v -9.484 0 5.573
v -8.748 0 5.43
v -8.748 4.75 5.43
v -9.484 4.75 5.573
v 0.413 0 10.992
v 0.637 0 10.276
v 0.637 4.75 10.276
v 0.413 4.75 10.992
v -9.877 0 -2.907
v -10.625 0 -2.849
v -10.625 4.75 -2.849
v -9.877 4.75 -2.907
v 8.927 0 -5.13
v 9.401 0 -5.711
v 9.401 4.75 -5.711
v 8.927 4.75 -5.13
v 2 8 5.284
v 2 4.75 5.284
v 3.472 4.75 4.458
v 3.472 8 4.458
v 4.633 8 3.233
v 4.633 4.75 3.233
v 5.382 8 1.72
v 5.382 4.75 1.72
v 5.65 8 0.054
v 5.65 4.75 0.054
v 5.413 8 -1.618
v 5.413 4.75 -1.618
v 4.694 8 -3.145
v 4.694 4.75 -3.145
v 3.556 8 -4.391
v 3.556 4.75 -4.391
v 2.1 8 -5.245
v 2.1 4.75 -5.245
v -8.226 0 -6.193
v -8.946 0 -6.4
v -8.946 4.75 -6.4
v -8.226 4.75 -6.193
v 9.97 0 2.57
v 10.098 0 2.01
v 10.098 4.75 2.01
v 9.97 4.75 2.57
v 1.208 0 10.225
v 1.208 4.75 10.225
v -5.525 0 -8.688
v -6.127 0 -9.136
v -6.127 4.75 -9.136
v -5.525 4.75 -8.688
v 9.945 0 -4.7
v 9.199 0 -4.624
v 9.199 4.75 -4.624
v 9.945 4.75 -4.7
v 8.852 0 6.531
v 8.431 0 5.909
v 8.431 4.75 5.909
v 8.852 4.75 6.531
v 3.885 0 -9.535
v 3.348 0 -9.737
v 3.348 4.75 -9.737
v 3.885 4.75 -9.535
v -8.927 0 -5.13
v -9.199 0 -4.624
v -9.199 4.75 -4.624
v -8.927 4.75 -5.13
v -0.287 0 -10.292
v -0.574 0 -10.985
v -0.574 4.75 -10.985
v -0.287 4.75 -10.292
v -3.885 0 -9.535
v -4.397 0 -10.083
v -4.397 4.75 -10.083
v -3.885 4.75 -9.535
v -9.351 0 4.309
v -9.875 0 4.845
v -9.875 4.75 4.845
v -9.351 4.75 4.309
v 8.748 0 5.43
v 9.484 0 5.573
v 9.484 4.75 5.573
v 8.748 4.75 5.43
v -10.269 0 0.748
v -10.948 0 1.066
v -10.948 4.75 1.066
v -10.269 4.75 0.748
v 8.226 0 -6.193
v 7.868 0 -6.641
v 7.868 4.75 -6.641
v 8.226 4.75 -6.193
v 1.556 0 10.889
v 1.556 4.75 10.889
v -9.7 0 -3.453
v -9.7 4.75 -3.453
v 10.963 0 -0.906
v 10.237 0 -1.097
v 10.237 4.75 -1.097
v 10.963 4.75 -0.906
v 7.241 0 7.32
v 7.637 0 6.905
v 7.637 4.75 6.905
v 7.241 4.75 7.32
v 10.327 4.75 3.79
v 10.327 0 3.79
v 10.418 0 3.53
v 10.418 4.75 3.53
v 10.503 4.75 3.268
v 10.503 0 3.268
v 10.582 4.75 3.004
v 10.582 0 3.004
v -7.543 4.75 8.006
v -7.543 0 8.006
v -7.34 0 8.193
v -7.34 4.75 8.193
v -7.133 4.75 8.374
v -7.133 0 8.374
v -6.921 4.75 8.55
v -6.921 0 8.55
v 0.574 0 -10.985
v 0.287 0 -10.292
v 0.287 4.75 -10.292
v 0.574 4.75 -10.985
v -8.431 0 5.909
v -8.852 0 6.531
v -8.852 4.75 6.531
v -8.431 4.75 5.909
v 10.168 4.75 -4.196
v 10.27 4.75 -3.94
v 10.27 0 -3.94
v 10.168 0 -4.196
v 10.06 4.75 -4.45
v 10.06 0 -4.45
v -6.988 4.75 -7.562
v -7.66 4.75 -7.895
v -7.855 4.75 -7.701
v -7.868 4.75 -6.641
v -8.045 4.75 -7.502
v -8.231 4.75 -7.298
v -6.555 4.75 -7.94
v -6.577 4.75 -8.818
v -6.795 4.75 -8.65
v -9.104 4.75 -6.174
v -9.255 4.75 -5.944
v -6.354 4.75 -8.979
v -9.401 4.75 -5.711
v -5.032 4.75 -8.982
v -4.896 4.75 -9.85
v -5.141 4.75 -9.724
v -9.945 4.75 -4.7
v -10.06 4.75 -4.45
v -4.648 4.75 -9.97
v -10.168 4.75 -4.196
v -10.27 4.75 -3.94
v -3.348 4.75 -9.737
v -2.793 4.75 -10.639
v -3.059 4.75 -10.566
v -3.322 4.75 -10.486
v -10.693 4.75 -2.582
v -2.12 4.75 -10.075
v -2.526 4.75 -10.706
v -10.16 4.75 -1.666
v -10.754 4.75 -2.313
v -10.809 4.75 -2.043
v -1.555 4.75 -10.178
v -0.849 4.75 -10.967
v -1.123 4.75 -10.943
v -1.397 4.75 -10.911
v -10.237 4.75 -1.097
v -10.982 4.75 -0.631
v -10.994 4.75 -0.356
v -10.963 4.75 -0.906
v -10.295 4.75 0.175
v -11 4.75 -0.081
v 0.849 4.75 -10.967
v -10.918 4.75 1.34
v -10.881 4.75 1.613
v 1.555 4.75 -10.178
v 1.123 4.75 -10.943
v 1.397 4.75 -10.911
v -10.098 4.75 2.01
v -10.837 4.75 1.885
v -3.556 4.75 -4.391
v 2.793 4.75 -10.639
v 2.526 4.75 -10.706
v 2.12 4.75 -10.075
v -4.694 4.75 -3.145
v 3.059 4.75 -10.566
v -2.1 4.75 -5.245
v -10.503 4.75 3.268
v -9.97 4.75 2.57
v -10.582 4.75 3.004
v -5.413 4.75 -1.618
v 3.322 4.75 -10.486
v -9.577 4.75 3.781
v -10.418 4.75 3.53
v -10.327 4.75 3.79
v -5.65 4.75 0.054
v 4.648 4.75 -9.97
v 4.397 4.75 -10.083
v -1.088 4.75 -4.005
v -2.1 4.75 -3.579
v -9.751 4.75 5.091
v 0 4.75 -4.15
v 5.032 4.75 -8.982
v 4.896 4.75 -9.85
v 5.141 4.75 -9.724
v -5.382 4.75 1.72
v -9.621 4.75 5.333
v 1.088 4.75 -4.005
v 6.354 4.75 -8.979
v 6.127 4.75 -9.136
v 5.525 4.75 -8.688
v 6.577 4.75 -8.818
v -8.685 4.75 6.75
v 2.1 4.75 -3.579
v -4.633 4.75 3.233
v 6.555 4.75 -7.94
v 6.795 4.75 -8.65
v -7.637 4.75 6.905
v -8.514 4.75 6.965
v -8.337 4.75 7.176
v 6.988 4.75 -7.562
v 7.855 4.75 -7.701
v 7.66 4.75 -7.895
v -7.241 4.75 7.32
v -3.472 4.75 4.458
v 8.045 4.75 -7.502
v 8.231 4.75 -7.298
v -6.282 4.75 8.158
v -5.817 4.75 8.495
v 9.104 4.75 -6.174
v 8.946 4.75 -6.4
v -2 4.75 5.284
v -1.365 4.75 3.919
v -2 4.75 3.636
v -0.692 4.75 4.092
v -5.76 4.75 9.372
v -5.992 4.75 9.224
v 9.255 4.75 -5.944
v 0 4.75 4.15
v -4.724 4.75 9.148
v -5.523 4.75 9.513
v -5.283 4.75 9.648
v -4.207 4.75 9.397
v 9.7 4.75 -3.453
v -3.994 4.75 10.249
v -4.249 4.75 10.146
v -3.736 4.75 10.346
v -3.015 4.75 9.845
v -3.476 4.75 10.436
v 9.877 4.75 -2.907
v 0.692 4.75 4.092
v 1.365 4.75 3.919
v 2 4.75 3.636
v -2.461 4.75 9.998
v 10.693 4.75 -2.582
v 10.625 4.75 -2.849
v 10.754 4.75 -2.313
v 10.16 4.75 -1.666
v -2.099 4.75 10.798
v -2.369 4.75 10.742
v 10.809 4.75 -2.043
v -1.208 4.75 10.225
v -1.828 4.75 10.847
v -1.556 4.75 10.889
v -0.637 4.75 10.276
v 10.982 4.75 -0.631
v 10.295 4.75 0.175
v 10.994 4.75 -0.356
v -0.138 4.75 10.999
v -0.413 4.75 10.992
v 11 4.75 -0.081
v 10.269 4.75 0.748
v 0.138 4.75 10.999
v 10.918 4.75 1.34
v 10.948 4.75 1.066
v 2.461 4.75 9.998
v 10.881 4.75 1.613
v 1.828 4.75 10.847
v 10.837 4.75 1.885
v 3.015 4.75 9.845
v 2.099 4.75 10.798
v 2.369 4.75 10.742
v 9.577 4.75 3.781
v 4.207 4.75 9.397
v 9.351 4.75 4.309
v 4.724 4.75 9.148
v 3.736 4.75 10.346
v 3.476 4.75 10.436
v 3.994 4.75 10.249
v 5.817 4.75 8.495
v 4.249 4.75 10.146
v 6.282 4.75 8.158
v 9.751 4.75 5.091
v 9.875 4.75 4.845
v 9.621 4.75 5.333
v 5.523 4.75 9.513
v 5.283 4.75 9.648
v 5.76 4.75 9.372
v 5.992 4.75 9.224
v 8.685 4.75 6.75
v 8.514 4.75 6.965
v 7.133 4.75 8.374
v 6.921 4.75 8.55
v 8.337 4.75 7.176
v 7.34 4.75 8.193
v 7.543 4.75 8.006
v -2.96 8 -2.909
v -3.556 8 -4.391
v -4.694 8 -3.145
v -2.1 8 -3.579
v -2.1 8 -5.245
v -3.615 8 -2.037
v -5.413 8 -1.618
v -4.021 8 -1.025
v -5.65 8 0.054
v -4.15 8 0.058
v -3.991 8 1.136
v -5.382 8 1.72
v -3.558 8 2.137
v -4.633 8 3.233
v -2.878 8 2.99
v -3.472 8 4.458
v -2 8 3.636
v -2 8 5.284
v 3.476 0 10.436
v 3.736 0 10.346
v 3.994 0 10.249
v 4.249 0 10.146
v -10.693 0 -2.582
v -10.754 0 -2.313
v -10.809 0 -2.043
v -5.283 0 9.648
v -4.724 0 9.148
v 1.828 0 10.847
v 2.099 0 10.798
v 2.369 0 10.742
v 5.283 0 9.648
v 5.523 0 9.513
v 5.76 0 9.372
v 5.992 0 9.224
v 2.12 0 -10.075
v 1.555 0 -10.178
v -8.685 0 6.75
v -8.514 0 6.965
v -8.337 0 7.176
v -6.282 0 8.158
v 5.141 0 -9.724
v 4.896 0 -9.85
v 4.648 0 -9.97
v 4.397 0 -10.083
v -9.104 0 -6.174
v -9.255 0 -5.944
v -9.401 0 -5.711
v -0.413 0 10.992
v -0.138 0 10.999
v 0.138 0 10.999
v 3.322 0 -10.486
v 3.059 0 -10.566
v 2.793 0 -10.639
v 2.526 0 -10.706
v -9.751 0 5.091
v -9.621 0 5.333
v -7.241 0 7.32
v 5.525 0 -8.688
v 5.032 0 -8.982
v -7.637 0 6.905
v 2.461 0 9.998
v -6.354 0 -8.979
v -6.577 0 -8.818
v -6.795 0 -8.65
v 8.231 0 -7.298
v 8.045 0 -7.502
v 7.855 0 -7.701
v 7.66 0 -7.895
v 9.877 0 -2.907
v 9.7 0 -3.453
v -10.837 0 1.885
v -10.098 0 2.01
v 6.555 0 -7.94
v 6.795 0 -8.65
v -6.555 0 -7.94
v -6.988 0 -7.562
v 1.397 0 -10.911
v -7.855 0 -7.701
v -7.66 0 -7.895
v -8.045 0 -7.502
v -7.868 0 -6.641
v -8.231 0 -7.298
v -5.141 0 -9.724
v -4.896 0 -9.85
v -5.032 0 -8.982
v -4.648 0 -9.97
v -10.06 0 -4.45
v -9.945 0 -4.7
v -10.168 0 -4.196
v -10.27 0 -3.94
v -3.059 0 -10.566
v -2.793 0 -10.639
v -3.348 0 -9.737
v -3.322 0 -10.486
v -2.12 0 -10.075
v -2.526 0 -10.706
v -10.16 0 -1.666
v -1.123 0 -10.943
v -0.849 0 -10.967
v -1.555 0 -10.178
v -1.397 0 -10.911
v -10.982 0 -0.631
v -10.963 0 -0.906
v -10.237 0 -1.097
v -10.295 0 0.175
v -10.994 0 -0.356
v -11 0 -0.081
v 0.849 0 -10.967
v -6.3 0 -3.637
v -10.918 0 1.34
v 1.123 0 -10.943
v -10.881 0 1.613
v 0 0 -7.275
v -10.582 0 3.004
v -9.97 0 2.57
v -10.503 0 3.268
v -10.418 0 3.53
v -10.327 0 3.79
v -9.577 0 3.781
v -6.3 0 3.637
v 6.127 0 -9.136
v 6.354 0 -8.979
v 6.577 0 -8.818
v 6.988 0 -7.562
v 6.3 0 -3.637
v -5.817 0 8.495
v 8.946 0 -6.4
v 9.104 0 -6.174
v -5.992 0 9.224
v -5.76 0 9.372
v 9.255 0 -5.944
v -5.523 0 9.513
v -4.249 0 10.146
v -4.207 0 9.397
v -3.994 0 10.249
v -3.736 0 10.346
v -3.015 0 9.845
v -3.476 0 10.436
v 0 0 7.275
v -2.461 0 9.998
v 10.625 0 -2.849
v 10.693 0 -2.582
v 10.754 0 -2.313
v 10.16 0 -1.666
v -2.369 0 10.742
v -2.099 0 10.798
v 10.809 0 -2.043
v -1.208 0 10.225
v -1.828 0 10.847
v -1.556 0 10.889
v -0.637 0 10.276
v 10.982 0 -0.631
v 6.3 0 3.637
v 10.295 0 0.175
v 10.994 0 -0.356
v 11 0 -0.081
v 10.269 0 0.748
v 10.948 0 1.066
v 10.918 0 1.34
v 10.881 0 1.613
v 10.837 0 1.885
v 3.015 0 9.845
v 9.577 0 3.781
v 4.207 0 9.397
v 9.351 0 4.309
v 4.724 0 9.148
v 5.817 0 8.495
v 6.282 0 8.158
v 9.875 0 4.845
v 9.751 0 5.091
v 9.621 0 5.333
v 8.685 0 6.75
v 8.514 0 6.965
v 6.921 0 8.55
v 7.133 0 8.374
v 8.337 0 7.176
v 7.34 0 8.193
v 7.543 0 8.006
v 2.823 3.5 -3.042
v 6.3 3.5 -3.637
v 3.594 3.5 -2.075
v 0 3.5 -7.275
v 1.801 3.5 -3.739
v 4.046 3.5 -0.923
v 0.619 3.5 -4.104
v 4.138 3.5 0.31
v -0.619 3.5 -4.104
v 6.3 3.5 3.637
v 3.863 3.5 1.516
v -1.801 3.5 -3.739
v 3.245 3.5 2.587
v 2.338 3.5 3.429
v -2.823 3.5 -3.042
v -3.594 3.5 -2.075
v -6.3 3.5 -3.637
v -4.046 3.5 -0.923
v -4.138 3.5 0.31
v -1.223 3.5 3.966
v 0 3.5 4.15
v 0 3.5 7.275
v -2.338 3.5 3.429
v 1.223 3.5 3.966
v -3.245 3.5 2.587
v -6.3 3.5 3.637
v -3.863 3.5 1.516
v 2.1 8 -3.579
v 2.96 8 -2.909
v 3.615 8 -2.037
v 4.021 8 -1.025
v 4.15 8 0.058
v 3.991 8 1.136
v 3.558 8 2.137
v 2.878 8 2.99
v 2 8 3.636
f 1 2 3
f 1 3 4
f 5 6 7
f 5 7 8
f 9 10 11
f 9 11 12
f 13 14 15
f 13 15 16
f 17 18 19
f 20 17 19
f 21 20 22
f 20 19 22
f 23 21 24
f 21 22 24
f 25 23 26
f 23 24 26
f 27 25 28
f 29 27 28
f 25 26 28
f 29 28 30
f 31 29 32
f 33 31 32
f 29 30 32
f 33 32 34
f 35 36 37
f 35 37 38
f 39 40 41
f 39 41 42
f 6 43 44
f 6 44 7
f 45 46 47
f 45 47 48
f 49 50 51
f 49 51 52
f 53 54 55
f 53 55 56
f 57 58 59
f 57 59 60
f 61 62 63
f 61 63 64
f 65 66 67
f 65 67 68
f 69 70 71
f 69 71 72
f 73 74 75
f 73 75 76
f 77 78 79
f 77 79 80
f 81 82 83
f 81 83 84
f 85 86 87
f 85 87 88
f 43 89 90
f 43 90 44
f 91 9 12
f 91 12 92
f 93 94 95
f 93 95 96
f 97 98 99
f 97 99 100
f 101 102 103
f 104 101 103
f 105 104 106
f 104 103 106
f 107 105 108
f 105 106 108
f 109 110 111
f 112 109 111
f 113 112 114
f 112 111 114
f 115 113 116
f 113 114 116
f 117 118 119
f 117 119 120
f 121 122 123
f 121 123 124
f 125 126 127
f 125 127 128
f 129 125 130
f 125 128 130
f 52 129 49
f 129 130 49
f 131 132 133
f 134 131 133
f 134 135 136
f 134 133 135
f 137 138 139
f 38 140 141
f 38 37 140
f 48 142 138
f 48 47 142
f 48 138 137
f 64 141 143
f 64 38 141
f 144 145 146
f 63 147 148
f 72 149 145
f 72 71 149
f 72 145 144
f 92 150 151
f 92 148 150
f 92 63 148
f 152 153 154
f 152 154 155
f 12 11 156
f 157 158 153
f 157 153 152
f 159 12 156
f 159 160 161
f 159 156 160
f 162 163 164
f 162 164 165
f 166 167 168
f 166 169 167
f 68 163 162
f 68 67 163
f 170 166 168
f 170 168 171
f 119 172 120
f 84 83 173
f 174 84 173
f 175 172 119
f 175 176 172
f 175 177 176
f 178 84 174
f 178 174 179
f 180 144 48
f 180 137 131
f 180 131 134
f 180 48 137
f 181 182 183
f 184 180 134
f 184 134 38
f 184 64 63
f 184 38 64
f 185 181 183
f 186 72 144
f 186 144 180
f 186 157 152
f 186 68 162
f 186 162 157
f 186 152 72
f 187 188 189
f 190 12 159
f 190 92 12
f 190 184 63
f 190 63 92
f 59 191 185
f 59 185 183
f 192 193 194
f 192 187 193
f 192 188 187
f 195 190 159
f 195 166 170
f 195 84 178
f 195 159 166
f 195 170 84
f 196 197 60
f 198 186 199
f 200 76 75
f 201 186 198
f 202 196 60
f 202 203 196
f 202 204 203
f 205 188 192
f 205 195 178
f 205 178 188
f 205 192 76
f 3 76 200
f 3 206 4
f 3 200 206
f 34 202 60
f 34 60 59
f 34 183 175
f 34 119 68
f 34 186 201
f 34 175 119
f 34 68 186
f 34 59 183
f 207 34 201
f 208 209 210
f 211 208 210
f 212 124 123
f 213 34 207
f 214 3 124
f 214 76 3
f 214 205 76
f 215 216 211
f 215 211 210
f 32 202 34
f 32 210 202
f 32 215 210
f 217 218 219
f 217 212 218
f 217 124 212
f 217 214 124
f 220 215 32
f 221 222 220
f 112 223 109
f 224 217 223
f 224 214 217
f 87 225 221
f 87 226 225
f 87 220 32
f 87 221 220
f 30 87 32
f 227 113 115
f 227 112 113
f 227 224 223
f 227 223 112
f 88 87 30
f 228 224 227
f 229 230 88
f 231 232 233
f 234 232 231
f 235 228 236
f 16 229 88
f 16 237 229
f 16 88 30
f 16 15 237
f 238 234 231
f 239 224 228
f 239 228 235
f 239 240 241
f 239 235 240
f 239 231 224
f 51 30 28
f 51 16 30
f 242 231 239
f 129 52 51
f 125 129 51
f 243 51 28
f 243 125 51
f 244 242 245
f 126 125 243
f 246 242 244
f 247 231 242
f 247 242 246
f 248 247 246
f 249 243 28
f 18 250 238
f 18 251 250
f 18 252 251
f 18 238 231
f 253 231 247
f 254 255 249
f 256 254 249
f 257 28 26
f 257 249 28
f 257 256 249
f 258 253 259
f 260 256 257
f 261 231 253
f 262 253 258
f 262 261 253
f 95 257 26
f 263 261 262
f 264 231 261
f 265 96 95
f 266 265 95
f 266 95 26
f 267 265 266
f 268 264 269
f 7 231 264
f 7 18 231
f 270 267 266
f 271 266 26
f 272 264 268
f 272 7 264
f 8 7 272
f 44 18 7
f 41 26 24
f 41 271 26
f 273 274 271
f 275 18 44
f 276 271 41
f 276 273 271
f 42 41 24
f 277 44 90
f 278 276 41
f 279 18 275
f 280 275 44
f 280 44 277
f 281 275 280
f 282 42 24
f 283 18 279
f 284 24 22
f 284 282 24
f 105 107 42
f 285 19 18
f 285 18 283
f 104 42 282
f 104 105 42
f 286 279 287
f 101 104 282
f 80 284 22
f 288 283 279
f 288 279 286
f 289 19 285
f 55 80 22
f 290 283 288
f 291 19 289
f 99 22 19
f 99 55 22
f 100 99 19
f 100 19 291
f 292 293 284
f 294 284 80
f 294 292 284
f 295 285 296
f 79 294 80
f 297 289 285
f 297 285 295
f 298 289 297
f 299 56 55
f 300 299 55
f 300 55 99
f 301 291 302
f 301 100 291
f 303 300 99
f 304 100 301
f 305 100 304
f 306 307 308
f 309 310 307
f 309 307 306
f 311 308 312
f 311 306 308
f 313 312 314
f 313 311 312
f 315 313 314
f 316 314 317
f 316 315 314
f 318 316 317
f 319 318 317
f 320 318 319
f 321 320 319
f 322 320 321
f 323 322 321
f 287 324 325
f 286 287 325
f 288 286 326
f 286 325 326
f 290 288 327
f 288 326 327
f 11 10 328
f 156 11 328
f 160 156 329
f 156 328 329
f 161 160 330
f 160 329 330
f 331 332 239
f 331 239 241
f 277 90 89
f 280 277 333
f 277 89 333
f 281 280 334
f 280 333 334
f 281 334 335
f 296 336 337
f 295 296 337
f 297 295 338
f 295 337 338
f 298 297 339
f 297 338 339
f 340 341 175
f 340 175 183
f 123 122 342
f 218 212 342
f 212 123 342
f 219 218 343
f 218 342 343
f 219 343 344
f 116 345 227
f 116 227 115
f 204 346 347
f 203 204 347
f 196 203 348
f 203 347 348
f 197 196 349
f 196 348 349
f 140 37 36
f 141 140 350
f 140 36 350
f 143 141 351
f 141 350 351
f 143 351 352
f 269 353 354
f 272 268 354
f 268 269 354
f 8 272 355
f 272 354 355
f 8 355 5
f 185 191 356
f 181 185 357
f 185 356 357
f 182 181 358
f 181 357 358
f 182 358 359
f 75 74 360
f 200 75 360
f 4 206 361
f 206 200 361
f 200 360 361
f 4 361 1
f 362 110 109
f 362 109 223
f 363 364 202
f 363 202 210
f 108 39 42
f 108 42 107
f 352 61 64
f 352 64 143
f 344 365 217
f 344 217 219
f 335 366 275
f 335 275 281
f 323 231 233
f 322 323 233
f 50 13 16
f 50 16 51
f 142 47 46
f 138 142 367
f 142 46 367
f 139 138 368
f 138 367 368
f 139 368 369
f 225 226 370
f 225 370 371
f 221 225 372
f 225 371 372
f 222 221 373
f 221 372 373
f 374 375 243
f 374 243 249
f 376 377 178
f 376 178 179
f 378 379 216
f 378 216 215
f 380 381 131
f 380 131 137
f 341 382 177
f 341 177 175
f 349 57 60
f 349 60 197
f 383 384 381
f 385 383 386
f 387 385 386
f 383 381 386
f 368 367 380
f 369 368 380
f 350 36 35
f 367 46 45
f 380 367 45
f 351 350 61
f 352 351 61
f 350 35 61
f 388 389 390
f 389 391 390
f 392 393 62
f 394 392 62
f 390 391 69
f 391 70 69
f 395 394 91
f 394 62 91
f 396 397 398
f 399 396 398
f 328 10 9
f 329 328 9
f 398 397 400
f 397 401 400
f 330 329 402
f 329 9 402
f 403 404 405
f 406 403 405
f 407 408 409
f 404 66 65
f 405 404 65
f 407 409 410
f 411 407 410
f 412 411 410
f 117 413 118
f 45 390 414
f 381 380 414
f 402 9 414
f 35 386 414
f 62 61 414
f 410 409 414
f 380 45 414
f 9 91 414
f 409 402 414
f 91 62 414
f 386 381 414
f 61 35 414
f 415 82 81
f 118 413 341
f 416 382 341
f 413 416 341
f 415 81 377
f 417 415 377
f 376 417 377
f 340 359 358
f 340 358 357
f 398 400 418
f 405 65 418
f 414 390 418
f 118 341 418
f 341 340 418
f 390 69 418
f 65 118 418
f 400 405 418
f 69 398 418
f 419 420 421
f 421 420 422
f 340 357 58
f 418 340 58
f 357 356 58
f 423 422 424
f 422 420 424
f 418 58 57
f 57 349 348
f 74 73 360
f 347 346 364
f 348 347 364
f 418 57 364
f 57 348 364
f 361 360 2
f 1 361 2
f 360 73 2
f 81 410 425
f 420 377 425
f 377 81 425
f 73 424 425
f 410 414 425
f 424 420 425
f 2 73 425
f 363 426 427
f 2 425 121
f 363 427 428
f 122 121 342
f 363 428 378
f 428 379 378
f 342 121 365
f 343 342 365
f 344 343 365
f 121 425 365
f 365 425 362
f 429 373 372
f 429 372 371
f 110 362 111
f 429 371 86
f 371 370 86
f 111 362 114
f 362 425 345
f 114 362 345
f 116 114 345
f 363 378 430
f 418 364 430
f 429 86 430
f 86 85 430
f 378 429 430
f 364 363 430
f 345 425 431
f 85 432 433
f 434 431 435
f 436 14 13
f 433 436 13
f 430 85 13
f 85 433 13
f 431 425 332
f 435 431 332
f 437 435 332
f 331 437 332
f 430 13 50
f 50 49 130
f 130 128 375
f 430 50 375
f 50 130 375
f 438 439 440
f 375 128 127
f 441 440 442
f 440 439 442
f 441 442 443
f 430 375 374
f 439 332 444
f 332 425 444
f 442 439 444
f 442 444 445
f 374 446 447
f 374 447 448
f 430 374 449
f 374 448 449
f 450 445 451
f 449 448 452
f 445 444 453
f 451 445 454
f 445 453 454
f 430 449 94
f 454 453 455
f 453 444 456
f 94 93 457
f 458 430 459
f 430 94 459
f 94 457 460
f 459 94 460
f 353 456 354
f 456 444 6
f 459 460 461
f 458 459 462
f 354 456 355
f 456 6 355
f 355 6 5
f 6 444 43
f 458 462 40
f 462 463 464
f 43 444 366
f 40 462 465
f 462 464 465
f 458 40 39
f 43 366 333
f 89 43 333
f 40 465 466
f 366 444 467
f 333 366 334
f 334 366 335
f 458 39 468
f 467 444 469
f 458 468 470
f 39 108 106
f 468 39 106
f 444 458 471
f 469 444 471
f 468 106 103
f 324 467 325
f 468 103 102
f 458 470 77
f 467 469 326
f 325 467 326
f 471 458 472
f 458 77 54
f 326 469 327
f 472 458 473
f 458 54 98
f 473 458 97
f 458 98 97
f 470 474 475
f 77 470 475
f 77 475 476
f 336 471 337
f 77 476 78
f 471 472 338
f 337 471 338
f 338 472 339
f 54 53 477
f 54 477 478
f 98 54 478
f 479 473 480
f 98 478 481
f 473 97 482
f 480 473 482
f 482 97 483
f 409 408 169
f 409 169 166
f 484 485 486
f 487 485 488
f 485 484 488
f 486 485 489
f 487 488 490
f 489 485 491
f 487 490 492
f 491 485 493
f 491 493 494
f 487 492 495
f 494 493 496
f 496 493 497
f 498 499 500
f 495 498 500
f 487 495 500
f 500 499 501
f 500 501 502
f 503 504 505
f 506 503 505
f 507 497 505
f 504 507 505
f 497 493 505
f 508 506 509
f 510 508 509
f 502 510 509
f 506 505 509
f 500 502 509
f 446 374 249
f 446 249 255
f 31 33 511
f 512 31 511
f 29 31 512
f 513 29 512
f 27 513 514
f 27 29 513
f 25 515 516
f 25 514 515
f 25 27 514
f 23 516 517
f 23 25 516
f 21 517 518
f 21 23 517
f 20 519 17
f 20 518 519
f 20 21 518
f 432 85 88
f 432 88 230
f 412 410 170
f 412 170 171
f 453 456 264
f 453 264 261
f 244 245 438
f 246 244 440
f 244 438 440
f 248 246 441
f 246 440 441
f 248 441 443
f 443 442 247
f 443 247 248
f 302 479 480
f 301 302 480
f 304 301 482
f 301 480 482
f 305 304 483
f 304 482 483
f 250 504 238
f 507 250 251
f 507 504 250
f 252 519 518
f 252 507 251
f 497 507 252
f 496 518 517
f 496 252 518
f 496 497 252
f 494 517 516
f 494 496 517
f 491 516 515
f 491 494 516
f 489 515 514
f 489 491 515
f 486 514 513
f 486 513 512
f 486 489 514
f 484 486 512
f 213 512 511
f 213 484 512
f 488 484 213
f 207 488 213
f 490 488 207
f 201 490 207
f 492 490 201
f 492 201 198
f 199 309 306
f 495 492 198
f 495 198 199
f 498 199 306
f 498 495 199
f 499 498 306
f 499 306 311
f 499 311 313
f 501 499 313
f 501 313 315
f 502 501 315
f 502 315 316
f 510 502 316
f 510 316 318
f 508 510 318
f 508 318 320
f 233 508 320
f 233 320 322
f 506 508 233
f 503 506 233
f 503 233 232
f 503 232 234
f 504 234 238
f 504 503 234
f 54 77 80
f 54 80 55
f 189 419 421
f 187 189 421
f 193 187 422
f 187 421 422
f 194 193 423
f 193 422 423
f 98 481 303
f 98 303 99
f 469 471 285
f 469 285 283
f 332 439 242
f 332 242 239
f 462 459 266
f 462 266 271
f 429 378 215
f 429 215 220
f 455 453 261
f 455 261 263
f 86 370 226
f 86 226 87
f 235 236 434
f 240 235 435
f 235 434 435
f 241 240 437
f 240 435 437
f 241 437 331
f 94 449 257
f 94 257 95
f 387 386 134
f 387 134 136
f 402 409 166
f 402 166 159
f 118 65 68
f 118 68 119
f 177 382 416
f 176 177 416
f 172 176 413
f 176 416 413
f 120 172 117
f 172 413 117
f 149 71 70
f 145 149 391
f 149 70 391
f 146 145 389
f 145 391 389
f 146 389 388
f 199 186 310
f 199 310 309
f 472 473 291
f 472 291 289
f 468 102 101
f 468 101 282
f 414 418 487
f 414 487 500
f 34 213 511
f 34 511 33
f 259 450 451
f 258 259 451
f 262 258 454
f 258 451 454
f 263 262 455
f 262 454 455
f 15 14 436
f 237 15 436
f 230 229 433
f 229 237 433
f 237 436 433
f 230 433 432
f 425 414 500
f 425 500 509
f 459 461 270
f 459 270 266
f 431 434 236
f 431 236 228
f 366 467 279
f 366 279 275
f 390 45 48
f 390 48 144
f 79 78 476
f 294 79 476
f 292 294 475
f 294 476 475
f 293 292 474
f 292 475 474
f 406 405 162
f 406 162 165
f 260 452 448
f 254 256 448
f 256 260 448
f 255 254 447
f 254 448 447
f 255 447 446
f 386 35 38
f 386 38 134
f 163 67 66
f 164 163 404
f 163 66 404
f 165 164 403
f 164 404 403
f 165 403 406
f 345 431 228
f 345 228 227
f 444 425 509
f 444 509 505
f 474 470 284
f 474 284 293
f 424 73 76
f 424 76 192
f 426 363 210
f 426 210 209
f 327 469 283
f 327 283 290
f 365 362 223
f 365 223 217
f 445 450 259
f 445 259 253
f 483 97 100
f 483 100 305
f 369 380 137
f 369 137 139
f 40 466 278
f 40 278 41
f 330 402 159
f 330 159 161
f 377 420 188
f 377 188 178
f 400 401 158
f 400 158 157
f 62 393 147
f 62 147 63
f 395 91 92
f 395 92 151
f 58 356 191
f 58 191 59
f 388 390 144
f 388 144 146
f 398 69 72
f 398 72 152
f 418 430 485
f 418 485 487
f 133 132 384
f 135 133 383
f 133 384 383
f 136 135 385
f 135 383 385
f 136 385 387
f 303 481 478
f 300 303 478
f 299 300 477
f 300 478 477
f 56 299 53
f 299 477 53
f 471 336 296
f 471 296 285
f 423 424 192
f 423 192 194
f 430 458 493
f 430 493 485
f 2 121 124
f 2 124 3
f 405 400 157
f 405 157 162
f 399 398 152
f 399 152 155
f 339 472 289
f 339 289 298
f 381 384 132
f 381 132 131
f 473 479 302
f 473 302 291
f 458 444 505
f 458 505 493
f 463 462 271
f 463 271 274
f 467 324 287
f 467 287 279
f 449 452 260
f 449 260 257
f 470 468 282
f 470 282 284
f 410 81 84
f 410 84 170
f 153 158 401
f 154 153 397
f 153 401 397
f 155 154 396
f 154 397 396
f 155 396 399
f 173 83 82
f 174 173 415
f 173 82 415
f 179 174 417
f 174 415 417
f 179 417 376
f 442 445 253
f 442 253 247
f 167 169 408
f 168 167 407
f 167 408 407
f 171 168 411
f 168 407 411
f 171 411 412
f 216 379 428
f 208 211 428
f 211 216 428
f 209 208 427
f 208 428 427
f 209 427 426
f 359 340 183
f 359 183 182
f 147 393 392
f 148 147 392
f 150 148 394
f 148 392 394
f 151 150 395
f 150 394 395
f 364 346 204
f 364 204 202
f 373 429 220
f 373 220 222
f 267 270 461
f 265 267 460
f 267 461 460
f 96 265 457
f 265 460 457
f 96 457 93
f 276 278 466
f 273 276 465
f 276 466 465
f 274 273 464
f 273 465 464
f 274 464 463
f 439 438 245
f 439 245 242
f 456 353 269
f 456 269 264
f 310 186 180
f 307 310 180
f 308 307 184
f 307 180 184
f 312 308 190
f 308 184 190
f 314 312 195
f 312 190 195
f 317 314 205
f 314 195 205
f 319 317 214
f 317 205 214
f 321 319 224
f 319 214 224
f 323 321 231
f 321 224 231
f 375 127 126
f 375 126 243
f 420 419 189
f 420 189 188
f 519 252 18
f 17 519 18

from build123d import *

# Parameters (mm, degrees)
SKETCH_1_R               = 5.65
SKETCH_1_R_2             = 4.15
EXTRUDE_1_DEPTH          = 8
SKETCH_1_3_R             = 11
SKETCH_1_3_R_2           = 5.65
EXTRUDE_2_DEPTH          = 4.75
CUT_EXTRUDE_1_DEPTH      = 3.5
CUT_EXTRUDE_START        = -3.25
CUT_EXTRUDE_3_DEPTH      = 3.25
CUT_EXTRUDE_START_2      = -10
CUT_EXTRUDE_4_DEPTH      = 10
PATTERN_CIRCULAR_1_COUNT = 35


with BuildPart() as part:
    # 草图1 → 凸台-拉伸1 (new body)
    with BuildSketch(Plane(origin=(0, 0, 0), x_dir=(1, 0, 0), z_dir=(0, 1, 0))):
        with Locations(Location((0, 0, 0), (0, 0, 270))):
            Circle(SKETCH_1_R)
        with Locations(Location((0, 0, 0), (0, 0, 270))):
            Circle(SKETCH_1_R_2, mode=Mode.SUBTRACT)
    extrude(amount=EXTRUDE_1_DEPTH)

    # 草图1<3> → 凸台-拉伸2 (add)
    with BuildSketch(Plane(origin=(0, 0, 0), x_dir=(1, 0, 0), z_dir=(0, 1, 0))):
        with Locations(Location((0, 0, 0), (0, 0, 270))):
            Circle(SKETCH_1_3_R)
        with Locations(Location((0, 0, 0), (0, 0, 270))):
            Circle(SKETCH_1_3_R_2, mode=Mode.SUBTRACT)
    extrude(amount=EXTRUDE_2_DEPTH)

    # 草图2 → 切除-拉伸1 (cut)
    with BuildSketch(Plane.XZ):
        Polygon((0, -7.274613392), (-6.3, -3.637306696), (-6.3, 3.637306696), (0, 7.274613392), (6.3, 3.637306696), (6.3, -3.637306696), align=None)
    extrude(amount=-CUT_EXTRUDE_1_DEPTH, mode=Mode.SUBTRACT)

    # 草图4 → 切除-拉伸3 (cut)
    with BuildSketch(Plane(origin=(0, 8, 0), x_dir=(1, 0, 0), z_dir=(0, 1, 0)).offset(CUT_EXTRUDE_START)):
        with BuildLine():
            Line((-2.1, 5.245235934), (-2.1, 3.579455266))
            ThreePointArc((-2.1, 3.579455266), (0, 4.15), (2.1, 3.579455266))
            Line((2.1, 3.579455266), (2.1, 5.245235934))
            ThreePointArc((2.1, 5.245235934), (0, 5.65), (-2.1, 5.245235934))
        make_face()
        with BuildLine():
            Line((2, -3.636275567), (2, -5.284174486))
            ThreePointArc((2, -5.284174486), (0, -5.65), (-2, -5.284174486))
            Line((-2, -5.284174486), (-2, -3.636275567))
            ThreePointArc((-2, -3.636275567), (0, -4.15), (2, -3.636275567))
        make_face()
    extrude(amount=CUT_EXTRUDE_3_DEPTH, mode=Mode.SUBTRACT)

    # 草图5 → 切除-拉伸4 (cut)
    with BuildSketch(Plane(origin=(0, 4.75, 0), x_dir=(1, 0, 0), z_dir=(0, 1, 0)).offset(CUT_EXTRUDE_START_2)):
        with BuildLine():
            ThreePointArc((0.574025149, 10.985012295), (0, 11), (-0.574025149, 10.985012295))
            Line((-0.574025149, 10.985012295), (-0.287012574, 10.292102646))
            Line((-0.287012574, 10.292102646), (0.287012574, 10.292102646))
            Line((0.287012574, 10.292102646), (0.574025149, 10.985012295))
        make_face()
    cut_extrude_4 = extrude(amount=CUT_EXTRUDE_4_DEPTH, mode=Mode.SUBTRACT)

    # 阵列(圆周)1: 切除-拉伸4 ×35 about axis
    pattern_circular_1_axis = Axis((0, 0, 0), (0, 1, 0))
    for i in range(1, PATTERN_CIRCULAR_1_COUNT):
        add(cut_extrude_4.rotate(pattern_circular_1_axis, i * 360 / PATTERN_CIRCULAR_1_COUNT), mode=Mode.SUBTRACT)


solid = part.part
